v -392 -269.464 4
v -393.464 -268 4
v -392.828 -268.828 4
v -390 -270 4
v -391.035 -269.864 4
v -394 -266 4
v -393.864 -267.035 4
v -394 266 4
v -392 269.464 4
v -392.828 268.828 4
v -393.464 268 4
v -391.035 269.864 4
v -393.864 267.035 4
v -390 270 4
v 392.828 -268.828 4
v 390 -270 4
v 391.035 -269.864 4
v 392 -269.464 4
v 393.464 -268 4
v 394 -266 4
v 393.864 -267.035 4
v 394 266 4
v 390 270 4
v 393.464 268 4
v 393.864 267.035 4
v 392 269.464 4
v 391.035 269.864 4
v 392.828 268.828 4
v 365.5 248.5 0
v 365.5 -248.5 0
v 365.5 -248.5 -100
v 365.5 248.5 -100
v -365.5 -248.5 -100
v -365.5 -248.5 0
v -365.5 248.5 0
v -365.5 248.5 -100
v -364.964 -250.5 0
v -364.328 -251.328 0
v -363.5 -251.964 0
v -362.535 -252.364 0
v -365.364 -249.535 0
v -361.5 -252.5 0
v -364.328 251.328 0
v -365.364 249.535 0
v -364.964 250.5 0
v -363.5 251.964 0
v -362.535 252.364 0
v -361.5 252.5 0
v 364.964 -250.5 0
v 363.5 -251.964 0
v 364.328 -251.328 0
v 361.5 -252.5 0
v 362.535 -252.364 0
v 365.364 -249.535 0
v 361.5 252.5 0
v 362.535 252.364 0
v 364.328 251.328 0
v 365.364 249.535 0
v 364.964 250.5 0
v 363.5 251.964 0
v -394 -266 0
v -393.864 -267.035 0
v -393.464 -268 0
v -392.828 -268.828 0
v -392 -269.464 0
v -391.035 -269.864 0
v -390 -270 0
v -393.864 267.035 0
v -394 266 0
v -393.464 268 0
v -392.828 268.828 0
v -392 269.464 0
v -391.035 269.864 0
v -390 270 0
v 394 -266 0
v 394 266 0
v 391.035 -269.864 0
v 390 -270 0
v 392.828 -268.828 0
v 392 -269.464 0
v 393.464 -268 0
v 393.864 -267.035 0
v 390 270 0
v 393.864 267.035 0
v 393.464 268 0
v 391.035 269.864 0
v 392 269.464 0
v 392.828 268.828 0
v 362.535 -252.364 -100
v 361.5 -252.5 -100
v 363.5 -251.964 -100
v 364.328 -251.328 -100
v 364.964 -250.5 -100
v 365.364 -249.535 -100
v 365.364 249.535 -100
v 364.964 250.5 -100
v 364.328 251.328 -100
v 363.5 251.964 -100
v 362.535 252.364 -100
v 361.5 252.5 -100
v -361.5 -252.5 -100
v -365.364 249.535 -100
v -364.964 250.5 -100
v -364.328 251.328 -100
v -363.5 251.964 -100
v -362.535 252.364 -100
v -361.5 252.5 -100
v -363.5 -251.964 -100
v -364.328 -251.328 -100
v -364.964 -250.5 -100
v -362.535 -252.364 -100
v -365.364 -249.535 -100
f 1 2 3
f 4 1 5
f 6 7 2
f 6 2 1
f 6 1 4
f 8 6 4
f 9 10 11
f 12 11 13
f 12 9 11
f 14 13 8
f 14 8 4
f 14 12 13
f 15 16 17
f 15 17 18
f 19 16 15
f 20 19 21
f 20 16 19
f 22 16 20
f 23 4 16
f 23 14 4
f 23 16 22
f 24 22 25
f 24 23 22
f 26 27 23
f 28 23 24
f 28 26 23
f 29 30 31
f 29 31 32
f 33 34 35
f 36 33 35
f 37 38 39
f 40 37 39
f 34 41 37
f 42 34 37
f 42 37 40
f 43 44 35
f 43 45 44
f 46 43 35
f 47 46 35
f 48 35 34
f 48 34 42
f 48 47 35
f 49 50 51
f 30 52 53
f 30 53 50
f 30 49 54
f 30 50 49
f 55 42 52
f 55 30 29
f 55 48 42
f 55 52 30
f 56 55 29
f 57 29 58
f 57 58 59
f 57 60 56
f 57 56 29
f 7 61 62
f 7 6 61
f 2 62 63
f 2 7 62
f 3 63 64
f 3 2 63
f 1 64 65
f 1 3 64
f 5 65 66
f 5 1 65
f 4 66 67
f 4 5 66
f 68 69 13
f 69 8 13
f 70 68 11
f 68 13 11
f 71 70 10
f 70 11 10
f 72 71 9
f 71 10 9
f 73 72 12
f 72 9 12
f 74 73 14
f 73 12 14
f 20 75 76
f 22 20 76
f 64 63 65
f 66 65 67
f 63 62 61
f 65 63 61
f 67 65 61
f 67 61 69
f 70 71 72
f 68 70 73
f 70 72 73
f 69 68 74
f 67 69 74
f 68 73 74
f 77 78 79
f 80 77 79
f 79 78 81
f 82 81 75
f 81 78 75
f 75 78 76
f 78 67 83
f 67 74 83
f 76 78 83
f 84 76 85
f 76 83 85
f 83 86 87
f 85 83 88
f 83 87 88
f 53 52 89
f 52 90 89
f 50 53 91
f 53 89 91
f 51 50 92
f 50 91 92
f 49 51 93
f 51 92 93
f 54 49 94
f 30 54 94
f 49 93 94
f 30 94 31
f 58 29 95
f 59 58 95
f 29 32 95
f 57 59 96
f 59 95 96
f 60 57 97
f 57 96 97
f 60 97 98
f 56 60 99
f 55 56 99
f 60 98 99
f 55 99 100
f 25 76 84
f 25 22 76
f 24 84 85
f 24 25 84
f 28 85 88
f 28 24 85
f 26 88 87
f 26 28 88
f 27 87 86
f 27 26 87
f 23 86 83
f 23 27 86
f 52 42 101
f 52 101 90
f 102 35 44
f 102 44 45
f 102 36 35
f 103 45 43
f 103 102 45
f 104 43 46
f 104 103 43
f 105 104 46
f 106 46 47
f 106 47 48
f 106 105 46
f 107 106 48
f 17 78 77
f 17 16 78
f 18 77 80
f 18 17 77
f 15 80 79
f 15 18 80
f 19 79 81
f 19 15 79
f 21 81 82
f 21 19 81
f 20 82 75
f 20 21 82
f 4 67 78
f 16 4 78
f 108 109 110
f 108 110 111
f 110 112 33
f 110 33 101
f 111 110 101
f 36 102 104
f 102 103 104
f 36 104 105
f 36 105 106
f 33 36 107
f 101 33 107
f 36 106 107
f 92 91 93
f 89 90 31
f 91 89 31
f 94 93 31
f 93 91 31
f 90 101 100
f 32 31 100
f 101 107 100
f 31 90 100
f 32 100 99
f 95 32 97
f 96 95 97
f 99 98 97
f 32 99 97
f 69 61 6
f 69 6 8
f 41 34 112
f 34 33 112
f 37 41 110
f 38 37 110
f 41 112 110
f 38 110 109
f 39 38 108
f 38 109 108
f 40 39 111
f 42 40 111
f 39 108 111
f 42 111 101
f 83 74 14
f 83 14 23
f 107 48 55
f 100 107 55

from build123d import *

# Parameters (mm, degrees)
F0_W     = 731
F0_H     = 505
F1_DEPTH = 100
F2_W     = 788
F2_H     = 540
F3_DEPTH = 4
F4_R     = 4
F4_2_R   = 4


with BuildPart() as f1:
    # F0 (on Top) → F1 (new body)
    with BuildSketch(Plane.XY):
        Rectangle(F0_W, F0_H)
    extrude(amount=-F1_DEPTH)

    # F4#2
    f4_2_edges = [f1.edges().sort_by_distance(p)[0] for p in [
        (365.5, -252.5, -50),
        (365.5, 252.5, -50),
        (-365.5, 252.5, -50),
        (-365.5, -252.5, -50),
    ]]
    fillet(f4_2_edges, radius=F4_2_R)


with BuildPart() as f3:
    # F2 (on face) → F3 (new body)
    with BuildSketch(Plane.XY):
        Rectangle(F2_W, F2_H)
    extrude(amount=F3_DEPTH)

    # F4
    f4_edges = [f3.edges().sort_by_distance(p)[0] for p in [
        (-394, -270, 2),
        (394, -270, 2),
        (394, 270, 2),
        (-394, 270, 2),
    ]]
    fillet(f4_edges, radius=F4_R)


solid = Compound([f1.part, f3.part])
